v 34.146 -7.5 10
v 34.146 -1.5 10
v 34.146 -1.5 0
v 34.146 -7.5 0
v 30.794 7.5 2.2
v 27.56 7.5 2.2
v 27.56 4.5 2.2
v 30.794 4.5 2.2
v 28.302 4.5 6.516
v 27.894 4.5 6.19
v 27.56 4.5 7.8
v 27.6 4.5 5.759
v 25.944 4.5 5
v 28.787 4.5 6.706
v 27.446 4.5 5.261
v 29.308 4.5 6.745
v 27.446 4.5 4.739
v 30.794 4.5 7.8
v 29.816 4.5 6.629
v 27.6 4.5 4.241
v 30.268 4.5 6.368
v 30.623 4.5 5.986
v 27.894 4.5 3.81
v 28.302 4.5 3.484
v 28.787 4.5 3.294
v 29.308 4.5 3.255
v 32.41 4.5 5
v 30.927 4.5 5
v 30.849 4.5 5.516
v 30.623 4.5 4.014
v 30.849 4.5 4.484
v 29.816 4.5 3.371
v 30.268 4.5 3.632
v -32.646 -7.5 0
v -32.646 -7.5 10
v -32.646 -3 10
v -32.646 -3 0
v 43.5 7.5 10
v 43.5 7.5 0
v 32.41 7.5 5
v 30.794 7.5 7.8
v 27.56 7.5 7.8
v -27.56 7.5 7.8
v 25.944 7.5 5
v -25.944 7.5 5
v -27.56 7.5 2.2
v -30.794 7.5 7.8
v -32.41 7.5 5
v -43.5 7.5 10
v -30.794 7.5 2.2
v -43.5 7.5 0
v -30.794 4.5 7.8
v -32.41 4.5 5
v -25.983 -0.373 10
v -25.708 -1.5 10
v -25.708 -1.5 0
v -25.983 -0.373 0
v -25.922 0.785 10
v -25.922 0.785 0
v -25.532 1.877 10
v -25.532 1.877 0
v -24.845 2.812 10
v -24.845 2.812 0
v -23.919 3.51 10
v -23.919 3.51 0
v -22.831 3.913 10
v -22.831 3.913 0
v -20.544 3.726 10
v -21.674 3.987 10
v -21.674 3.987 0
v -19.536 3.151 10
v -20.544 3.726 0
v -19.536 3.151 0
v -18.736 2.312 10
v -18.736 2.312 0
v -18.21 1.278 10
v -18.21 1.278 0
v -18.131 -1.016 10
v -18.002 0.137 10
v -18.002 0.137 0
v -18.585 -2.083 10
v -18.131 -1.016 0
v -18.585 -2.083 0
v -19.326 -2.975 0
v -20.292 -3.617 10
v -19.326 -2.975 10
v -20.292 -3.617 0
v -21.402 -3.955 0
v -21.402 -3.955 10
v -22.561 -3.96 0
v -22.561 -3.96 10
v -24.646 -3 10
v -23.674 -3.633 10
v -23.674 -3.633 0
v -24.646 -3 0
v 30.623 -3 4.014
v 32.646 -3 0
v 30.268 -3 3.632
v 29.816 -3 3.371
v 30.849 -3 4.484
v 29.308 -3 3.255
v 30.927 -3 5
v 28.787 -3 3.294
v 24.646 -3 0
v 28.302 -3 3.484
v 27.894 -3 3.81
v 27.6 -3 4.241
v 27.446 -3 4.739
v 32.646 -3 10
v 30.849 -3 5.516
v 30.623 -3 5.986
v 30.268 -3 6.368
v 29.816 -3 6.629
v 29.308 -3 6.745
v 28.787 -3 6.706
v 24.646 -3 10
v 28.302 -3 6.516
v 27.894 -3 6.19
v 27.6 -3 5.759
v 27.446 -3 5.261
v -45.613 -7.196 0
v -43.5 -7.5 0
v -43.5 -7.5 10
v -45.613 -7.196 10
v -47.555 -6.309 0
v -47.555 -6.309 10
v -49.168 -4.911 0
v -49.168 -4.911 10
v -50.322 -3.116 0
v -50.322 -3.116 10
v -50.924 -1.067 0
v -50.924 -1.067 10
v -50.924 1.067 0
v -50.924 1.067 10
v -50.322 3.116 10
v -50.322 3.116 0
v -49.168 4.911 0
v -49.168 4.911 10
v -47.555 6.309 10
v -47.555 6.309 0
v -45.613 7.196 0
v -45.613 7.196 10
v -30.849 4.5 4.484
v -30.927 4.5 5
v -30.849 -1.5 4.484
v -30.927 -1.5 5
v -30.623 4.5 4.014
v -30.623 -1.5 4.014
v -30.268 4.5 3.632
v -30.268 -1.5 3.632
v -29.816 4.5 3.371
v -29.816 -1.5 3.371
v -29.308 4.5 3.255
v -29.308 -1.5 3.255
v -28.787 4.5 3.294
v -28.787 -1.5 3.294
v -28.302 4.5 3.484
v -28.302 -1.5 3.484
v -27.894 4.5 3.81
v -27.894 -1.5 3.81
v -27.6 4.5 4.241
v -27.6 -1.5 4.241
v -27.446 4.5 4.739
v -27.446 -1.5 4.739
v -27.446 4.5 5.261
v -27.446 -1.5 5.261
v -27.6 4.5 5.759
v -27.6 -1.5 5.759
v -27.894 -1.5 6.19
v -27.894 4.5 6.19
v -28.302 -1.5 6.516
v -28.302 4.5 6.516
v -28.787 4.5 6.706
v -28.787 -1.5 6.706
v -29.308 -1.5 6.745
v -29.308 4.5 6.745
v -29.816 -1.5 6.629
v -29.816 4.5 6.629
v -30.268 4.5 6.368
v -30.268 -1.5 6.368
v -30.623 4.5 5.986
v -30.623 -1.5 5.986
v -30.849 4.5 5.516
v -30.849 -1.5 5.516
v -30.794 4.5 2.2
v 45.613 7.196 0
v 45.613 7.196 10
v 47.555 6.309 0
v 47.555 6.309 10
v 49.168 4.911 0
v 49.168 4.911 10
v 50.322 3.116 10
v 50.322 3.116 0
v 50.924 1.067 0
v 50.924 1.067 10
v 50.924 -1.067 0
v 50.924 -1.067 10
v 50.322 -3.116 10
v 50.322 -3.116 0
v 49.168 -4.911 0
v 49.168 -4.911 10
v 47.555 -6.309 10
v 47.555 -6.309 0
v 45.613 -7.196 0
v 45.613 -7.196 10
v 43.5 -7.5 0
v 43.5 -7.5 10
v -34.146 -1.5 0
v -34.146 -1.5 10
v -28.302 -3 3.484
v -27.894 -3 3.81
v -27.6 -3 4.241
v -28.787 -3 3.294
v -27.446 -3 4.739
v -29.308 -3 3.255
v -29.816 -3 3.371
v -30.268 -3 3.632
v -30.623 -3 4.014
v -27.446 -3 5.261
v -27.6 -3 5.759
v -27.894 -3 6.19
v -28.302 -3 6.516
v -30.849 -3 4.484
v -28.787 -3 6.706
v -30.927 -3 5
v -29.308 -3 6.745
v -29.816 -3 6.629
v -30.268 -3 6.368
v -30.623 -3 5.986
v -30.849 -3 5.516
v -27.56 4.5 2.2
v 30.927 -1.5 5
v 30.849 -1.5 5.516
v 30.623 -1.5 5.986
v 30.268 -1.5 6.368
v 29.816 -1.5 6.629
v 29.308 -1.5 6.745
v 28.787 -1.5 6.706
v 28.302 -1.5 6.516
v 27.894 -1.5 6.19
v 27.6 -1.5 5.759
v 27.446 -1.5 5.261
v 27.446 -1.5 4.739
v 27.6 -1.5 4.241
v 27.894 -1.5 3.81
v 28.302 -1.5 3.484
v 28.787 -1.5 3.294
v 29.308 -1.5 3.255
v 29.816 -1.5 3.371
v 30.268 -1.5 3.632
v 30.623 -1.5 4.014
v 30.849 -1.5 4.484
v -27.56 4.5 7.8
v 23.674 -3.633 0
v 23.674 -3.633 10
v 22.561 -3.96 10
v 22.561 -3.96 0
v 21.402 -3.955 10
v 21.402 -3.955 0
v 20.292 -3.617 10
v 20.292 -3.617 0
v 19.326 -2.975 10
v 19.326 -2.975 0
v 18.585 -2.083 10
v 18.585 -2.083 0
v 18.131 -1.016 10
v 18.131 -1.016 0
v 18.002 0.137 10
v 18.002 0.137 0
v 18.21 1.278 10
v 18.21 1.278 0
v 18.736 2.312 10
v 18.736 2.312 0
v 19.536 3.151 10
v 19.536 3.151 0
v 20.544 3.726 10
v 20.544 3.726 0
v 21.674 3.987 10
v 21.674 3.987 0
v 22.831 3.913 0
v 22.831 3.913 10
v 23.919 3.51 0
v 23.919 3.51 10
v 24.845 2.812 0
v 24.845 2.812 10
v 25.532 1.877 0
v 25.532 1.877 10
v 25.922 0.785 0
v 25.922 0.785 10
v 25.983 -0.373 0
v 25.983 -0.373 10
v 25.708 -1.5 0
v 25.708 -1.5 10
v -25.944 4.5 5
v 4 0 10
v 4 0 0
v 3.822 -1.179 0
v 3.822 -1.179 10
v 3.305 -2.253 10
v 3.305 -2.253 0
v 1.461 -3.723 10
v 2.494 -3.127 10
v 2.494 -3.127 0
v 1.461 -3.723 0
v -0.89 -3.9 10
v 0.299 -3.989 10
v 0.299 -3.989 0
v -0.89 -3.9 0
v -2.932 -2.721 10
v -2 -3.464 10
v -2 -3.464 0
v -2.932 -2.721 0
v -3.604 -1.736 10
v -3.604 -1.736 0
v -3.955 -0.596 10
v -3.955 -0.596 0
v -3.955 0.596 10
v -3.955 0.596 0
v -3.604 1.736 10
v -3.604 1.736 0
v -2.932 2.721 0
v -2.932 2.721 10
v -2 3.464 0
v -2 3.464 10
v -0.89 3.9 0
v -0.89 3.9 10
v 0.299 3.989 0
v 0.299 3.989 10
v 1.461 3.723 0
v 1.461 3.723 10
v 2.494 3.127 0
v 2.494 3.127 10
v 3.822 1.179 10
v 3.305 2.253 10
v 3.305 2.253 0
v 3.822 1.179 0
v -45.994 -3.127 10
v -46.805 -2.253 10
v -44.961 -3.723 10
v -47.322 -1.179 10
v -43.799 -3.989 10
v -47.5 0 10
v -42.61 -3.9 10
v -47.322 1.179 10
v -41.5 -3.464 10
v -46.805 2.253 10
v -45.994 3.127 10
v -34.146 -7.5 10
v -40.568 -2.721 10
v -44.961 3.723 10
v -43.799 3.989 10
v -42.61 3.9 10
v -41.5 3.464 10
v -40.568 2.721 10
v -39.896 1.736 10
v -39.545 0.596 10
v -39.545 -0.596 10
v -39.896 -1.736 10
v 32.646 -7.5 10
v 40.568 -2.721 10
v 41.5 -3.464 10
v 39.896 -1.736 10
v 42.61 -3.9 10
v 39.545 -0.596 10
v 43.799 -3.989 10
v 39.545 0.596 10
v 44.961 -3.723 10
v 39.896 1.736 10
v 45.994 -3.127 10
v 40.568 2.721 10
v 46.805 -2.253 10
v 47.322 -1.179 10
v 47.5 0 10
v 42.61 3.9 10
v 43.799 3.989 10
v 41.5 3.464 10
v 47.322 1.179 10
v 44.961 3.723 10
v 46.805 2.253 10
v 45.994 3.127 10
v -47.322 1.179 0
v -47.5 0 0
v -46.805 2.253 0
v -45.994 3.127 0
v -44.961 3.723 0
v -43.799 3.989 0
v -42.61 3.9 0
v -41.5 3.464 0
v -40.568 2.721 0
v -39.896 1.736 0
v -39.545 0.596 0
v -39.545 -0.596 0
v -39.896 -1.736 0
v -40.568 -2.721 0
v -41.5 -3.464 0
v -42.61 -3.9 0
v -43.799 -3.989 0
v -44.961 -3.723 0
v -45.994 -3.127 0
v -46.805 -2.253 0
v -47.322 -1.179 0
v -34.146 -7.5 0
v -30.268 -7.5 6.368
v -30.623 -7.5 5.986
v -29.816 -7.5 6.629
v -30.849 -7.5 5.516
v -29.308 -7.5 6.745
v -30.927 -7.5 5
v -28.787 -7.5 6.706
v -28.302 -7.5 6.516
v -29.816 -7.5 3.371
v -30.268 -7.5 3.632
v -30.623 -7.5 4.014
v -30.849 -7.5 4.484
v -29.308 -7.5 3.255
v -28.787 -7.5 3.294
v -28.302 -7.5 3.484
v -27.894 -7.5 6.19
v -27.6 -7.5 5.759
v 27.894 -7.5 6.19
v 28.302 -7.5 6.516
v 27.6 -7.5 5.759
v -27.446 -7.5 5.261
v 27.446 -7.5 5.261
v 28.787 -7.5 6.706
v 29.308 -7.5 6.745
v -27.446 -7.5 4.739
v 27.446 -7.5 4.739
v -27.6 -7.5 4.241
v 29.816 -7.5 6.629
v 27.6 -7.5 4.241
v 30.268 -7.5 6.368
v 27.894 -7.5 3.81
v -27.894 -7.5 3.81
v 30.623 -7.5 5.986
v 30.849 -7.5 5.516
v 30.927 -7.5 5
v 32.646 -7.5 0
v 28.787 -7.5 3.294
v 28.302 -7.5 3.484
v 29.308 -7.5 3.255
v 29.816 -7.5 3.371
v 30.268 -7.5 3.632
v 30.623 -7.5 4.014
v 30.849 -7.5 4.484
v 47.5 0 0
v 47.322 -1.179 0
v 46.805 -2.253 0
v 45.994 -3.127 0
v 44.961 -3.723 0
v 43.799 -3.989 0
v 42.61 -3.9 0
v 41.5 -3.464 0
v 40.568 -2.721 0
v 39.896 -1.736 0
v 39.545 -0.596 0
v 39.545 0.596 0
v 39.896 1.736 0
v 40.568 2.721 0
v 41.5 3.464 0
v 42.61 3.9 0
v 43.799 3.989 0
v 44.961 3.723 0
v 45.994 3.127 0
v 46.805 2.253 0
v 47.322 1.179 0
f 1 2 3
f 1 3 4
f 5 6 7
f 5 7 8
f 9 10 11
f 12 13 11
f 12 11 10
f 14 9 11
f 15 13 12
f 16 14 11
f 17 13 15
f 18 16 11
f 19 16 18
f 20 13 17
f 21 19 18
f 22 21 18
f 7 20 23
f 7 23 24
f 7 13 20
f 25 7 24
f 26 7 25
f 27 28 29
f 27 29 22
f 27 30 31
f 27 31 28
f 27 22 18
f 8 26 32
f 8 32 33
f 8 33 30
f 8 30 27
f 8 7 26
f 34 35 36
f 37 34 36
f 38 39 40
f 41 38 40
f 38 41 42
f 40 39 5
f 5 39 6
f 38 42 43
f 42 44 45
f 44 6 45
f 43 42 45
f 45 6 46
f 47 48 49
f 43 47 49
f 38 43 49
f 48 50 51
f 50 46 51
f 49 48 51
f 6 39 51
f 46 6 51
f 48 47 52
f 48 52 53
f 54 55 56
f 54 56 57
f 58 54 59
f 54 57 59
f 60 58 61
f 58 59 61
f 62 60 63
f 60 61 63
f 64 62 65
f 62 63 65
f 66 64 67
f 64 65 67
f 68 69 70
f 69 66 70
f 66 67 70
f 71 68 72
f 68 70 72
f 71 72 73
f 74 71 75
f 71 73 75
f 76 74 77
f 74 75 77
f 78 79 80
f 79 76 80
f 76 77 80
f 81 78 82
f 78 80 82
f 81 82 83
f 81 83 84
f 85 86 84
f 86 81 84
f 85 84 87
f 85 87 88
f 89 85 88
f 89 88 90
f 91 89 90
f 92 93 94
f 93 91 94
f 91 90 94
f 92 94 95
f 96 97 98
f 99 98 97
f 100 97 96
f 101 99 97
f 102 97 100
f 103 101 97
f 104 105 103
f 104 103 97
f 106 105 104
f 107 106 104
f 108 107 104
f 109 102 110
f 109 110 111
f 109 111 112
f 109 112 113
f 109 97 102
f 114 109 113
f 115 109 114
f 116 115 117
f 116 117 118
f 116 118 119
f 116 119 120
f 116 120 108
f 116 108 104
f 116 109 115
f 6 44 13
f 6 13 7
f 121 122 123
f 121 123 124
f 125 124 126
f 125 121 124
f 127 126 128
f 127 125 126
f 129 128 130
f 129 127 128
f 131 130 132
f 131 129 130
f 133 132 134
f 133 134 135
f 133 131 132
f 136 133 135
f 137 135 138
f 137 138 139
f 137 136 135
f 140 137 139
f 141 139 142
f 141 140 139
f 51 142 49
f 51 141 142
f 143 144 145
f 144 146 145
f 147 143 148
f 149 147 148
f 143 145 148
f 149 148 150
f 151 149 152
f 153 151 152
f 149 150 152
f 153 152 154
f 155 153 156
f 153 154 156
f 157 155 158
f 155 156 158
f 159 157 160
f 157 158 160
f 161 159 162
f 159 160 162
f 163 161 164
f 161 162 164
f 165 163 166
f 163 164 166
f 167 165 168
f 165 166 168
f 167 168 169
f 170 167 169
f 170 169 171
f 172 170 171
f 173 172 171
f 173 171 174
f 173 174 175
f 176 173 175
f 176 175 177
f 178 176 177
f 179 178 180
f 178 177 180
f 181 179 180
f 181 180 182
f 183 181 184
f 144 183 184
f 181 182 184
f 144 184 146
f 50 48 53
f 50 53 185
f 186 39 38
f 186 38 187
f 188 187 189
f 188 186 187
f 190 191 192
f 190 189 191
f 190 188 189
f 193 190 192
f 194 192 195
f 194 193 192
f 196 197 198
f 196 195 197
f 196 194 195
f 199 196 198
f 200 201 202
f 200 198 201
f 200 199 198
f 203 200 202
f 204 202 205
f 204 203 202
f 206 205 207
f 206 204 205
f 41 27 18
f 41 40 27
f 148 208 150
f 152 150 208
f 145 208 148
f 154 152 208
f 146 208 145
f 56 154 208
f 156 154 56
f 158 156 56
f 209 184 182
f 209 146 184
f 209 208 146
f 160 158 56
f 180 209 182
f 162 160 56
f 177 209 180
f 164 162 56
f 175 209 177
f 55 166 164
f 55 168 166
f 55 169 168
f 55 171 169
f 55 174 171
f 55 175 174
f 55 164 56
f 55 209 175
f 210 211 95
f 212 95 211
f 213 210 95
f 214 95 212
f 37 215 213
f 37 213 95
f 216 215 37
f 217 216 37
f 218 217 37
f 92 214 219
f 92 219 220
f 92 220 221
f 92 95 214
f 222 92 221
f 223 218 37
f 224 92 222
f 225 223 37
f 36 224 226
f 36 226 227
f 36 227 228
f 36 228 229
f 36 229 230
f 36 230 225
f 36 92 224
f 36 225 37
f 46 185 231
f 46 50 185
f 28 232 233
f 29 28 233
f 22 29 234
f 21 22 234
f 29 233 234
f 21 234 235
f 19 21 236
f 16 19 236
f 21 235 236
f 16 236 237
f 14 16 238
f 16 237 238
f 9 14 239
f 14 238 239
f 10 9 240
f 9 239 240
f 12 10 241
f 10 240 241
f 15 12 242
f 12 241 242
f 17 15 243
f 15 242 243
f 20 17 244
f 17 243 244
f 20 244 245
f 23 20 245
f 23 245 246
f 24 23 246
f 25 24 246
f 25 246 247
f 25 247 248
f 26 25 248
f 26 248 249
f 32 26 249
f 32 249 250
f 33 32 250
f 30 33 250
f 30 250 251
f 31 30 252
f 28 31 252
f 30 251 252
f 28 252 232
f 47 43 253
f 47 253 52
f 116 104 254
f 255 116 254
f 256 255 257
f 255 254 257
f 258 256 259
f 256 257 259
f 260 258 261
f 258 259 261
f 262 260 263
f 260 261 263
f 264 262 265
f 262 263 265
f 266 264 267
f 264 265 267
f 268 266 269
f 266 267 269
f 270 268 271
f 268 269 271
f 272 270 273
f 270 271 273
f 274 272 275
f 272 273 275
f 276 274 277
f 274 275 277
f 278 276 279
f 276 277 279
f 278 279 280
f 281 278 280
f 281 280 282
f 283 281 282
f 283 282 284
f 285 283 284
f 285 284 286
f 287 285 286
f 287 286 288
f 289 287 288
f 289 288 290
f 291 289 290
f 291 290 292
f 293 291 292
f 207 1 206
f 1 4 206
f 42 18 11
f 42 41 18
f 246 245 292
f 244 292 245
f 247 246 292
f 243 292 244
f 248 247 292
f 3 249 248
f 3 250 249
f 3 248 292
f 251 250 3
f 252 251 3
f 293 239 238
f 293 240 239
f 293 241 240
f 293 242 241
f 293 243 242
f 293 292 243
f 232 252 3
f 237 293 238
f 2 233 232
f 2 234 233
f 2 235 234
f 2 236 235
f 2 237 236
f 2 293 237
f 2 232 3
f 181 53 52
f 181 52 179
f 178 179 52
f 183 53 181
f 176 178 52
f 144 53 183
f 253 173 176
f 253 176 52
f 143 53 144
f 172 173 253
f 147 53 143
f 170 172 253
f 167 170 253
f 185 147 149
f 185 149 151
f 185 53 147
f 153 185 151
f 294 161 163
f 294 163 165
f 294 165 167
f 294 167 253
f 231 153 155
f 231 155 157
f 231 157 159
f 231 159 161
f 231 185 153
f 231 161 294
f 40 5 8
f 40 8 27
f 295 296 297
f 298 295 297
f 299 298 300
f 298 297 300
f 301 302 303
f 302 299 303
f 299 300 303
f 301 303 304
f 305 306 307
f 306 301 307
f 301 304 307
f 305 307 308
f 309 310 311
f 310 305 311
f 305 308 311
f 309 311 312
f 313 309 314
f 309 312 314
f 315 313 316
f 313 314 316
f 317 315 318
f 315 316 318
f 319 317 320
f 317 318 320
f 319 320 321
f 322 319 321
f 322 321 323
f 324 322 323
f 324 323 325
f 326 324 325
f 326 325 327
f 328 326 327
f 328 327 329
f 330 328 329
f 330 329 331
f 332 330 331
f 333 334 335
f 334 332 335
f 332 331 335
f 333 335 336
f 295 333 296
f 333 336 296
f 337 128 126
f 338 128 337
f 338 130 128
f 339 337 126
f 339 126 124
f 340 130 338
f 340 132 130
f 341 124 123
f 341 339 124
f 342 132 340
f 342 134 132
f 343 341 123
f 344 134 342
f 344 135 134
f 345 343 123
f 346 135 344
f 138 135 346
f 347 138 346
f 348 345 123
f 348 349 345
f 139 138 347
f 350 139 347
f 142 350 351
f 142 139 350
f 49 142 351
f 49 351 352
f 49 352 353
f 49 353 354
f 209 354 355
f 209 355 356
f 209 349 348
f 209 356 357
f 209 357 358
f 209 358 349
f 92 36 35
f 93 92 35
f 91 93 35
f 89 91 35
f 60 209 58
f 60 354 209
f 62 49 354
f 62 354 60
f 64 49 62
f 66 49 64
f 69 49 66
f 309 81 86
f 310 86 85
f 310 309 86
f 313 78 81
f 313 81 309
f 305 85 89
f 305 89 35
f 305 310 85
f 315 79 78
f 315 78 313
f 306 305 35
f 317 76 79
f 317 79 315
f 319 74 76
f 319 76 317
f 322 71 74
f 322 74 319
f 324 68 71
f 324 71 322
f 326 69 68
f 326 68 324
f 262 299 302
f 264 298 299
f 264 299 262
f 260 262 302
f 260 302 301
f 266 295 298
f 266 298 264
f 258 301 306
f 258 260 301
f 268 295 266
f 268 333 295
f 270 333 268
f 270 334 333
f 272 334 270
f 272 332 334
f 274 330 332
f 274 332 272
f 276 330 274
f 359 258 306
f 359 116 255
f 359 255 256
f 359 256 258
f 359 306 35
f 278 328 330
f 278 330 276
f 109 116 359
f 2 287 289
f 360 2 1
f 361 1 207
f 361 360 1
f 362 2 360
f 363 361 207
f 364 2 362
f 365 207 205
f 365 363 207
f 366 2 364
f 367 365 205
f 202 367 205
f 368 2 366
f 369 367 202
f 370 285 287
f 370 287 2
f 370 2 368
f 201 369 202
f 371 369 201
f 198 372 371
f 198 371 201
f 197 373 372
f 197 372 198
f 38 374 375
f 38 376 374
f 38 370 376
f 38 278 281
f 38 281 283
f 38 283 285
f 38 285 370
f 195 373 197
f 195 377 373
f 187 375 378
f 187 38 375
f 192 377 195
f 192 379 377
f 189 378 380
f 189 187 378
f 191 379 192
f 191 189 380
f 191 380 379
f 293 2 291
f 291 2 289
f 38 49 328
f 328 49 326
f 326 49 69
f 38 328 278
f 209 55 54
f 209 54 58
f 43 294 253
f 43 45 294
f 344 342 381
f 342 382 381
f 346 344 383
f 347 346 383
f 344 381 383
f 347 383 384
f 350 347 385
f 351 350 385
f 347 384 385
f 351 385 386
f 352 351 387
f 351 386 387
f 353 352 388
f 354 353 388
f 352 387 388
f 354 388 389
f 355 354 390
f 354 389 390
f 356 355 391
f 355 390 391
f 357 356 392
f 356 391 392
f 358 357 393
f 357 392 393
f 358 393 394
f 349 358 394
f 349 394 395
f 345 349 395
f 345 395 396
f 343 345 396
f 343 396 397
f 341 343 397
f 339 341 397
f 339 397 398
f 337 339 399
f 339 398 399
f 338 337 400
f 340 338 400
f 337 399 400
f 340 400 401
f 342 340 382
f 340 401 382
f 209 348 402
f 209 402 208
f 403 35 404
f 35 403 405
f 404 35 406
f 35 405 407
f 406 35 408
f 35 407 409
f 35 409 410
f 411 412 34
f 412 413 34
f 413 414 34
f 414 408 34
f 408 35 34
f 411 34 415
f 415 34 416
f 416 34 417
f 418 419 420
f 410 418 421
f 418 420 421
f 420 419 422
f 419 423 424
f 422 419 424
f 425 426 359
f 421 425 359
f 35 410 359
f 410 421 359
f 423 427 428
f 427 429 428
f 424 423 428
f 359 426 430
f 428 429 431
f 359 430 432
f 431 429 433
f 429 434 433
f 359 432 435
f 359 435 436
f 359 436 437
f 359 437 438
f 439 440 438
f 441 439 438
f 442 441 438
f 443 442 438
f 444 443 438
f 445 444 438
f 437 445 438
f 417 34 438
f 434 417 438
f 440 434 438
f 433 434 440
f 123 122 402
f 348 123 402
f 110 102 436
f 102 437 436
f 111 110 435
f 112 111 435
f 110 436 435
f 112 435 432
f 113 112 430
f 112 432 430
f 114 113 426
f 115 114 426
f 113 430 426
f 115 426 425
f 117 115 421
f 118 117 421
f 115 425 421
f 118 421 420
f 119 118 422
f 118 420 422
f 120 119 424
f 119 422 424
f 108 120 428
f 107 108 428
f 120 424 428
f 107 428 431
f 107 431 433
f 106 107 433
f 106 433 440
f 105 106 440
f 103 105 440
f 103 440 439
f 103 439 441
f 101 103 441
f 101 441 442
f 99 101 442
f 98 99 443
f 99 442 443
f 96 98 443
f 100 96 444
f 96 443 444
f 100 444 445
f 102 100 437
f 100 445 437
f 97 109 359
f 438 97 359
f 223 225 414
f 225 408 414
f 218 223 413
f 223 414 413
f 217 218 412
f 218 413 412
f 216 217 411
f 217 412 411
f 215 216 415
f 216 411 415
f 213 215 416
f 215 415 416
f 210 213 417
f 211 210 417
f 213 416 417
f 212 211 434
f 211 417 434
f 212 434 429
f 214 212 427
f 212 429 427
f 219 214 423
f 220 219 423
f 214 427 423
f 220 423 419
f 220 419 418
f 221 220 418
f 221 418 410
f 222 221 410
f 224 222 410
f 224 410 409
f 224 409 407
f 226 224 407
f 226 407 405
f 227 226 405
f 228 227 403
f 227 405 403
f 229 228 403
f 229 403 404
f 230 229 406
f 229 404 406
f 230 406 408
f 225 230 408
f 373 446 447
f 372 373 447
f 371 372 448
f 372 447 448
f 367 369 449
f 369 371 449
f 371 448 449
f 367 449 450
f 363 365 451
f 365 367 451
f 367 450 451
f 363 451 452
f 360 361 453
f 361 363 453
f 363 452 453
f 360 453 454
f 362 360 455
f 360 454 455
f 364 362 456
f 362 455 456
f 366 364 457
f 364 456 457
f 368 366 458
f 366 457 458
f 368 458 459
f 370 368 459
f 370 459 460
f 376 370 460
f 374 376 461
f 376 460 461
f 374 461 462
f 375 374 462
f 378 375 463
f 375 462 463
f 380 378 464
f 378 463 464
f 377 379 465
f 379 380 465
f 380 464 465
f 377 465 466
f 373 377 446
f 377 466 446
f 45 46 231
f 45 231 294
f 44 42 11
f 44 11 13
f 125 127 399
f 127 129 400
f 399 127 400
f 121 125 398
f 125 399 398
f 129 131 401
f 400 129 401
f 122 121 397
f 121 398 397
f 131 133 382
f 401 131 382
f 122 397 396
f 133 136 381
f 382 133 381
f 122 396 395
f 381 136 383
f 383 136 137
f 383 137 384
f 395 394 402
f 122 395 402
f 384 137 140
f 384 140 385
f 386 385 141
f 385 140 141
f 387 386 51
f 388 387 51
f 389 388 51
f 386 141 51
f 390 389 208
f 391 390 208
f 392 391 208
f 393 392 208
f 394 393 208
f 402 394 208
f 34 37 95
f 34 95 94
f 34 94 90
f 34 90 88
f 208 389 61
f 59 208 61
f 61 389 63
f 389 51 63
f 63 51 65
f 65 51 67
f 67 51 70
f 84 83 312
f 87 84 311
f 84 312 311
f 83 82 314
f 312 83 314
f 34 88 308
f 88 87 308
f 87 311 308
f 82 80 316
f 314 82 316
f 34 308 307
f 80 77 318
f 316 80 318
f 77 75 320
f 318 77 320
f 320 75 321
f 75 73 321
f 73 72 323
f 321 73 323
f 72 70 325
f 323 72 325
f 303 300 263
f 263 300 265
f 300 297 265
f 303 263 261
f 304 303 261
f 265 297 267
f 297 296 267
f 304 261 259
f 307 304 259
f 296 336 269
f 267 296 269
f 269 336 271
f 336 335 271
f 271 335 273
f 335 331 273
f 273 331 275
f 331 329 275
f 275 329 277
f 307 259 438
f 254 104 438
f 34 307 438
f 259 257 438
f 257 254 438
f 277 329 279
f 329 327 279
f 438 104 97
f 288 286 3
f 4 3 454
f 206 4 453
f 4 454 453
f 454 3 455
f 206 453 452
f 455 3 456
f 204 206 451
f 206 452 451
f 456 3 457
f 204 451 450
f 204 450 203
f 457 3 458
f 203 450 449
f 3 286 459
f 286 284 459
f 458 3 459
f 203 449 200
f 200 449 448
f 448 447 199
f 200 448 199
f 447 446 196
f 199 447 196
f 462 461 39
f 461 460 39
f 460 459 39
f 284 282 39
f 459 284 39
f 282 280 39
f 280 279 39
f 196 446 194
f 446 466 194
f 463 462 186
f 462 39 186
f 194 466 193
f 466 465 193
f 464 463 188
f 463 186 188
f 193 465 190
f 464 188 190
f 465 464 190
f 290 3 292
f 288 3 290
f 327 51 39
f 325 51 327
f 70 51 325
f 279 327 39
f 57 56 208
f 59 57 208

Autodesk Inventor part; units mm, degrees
ref_plane "YZ Plane" through (0, 0, 0) normal (1, 0, 0) x (0, 1, 0)
ref_plane "XZ Plane" through (0, 0, 0) normal (0, 1, 0) x (-1, 0, 0)
ref_plane "XY Plane" through (0, 0, 0) normal (0, 0, 1) x (1, 0, 0)
sketch "Sketch1" plane through (0, 0, 0) normal (0, 0, 1) x (1, 0, 0)
  circle A0 centre (0, 0) radius 4
  circle A1 centre (43.5, 0) radius 4
  circle A2 centre (22, 0) radius 4
  line L0 (0, 0) -> (43.5, 0) construction
  line L1 (0, -7.5) -> (43.5, -7.5)
  line L2 (43.5, 7.5) -> (0, 7.5)
  arc A3 (0, 7.5) -> (0, -7.5) centre (0, 0) ccw
  arc A4 (43.5, -7.5) -> (43.5, 7.5) centre (43.5, 0) ccw
  point P0 (21.75, 0)
  dimension "d1" = 8
  dimension "d2" = 8
  dimension "d4" = 15
  dimension "d19" = 43.5
  dimension "d22" = 22
extrude "Extrusion1" add sketch "Sketch1" along normal blind 10
sketch "Sketch2" plane through (0, 0, 10) normal (0, 0, 1) x (1, 0, 0)
  line L0 (24.6458, -1.5) -> (34.1458, -1.5)
  line L1 (34.1458, -1.5) -> (34.1458, -3)
  line L2 (34.1458, -3) -> (24.6458, -3)
  line L3 (24.6458, -3) -> (24.6458, -1.5)
  line L4 (0, -7.5) -> (43.5, -7.5) projected
  line L5 (34.1458, -3) -> (32.6458, -3)
  line L6 (32.6458, -3) -> (32.6458, -7.5)
  line L7 (32.6458, -7.5) -> (34.1458, -7.5)
  line L8 (34.1458, -7.5) -> (34.1458, -3)
  circle A0 centre (22, 0) radius 4 construction
  point P0 (0, 0)
  dimension "d7" = 1.5
  dimension "d8" = 8
  dimension "d9" = 1.5
  dimension "d18" = 1
extrude "Extrusion2" cut sketch "Sketch2" against normal through all
sketch "Sketch3" plane through (0, -7.5, 0) normal (0, -1, 0) x (1, 0, 0)
  line L0 (24.6458, 0) -> (32.6458, 0) construction
  line L1 (24.6458, 10) -> (24.6458, 0) construction
  line L2 (32.6458, 10) -> (24.6458, 10) construction
  line L3 (32.6458, 10) -> (32.6458, 0) construction
  line L4 (32.6458, 5) -> (25.7081, 5) construction
  line L5 (25.7081, 0) -> (25.7081, 10) construction
  circle A0 centre (29.1769, 5) radius 1.75
  point P0 (0, 0)
  dimension "d12" = 3.5
extrude "Extrusion3" cut sketch "Sketch3" against normal through all
sketch "Sketch4" plane through (0, 7.5, 0) normal (0, 1, 0) x (1, 0, 0)
  circle A0 centre (29.1769, -5) radius 1.75 construction
  line L0 (30.7935, -2.2) -> (32.4101, -5)
  line L1 (32.4101, -5) -> (30.7935, -7.8)
  line L2 (30.7935, -7.8) -> (27.5603, -7.8)
  line L3 (27.5603, -7.8) -> (25.9438, -5)
  line L4 (25.9438, -5) -> (27.5603, -2.2)
  line L5 (27.5603, -2.2) -> (30.7935, -2.2)
  point P0 (0, 0)
  dimension "d15" = 5.6
extrude "Extrusion4" cut sketch "Sketch4" against normal blind 3
mirror "Mirror1" about plane through (0, 0, 0) normal (1, 0, 0) of "Extrusion1", "Extrusion2", "Extrusion3", "Extrusion4"
properties part number "guide rod mount"
